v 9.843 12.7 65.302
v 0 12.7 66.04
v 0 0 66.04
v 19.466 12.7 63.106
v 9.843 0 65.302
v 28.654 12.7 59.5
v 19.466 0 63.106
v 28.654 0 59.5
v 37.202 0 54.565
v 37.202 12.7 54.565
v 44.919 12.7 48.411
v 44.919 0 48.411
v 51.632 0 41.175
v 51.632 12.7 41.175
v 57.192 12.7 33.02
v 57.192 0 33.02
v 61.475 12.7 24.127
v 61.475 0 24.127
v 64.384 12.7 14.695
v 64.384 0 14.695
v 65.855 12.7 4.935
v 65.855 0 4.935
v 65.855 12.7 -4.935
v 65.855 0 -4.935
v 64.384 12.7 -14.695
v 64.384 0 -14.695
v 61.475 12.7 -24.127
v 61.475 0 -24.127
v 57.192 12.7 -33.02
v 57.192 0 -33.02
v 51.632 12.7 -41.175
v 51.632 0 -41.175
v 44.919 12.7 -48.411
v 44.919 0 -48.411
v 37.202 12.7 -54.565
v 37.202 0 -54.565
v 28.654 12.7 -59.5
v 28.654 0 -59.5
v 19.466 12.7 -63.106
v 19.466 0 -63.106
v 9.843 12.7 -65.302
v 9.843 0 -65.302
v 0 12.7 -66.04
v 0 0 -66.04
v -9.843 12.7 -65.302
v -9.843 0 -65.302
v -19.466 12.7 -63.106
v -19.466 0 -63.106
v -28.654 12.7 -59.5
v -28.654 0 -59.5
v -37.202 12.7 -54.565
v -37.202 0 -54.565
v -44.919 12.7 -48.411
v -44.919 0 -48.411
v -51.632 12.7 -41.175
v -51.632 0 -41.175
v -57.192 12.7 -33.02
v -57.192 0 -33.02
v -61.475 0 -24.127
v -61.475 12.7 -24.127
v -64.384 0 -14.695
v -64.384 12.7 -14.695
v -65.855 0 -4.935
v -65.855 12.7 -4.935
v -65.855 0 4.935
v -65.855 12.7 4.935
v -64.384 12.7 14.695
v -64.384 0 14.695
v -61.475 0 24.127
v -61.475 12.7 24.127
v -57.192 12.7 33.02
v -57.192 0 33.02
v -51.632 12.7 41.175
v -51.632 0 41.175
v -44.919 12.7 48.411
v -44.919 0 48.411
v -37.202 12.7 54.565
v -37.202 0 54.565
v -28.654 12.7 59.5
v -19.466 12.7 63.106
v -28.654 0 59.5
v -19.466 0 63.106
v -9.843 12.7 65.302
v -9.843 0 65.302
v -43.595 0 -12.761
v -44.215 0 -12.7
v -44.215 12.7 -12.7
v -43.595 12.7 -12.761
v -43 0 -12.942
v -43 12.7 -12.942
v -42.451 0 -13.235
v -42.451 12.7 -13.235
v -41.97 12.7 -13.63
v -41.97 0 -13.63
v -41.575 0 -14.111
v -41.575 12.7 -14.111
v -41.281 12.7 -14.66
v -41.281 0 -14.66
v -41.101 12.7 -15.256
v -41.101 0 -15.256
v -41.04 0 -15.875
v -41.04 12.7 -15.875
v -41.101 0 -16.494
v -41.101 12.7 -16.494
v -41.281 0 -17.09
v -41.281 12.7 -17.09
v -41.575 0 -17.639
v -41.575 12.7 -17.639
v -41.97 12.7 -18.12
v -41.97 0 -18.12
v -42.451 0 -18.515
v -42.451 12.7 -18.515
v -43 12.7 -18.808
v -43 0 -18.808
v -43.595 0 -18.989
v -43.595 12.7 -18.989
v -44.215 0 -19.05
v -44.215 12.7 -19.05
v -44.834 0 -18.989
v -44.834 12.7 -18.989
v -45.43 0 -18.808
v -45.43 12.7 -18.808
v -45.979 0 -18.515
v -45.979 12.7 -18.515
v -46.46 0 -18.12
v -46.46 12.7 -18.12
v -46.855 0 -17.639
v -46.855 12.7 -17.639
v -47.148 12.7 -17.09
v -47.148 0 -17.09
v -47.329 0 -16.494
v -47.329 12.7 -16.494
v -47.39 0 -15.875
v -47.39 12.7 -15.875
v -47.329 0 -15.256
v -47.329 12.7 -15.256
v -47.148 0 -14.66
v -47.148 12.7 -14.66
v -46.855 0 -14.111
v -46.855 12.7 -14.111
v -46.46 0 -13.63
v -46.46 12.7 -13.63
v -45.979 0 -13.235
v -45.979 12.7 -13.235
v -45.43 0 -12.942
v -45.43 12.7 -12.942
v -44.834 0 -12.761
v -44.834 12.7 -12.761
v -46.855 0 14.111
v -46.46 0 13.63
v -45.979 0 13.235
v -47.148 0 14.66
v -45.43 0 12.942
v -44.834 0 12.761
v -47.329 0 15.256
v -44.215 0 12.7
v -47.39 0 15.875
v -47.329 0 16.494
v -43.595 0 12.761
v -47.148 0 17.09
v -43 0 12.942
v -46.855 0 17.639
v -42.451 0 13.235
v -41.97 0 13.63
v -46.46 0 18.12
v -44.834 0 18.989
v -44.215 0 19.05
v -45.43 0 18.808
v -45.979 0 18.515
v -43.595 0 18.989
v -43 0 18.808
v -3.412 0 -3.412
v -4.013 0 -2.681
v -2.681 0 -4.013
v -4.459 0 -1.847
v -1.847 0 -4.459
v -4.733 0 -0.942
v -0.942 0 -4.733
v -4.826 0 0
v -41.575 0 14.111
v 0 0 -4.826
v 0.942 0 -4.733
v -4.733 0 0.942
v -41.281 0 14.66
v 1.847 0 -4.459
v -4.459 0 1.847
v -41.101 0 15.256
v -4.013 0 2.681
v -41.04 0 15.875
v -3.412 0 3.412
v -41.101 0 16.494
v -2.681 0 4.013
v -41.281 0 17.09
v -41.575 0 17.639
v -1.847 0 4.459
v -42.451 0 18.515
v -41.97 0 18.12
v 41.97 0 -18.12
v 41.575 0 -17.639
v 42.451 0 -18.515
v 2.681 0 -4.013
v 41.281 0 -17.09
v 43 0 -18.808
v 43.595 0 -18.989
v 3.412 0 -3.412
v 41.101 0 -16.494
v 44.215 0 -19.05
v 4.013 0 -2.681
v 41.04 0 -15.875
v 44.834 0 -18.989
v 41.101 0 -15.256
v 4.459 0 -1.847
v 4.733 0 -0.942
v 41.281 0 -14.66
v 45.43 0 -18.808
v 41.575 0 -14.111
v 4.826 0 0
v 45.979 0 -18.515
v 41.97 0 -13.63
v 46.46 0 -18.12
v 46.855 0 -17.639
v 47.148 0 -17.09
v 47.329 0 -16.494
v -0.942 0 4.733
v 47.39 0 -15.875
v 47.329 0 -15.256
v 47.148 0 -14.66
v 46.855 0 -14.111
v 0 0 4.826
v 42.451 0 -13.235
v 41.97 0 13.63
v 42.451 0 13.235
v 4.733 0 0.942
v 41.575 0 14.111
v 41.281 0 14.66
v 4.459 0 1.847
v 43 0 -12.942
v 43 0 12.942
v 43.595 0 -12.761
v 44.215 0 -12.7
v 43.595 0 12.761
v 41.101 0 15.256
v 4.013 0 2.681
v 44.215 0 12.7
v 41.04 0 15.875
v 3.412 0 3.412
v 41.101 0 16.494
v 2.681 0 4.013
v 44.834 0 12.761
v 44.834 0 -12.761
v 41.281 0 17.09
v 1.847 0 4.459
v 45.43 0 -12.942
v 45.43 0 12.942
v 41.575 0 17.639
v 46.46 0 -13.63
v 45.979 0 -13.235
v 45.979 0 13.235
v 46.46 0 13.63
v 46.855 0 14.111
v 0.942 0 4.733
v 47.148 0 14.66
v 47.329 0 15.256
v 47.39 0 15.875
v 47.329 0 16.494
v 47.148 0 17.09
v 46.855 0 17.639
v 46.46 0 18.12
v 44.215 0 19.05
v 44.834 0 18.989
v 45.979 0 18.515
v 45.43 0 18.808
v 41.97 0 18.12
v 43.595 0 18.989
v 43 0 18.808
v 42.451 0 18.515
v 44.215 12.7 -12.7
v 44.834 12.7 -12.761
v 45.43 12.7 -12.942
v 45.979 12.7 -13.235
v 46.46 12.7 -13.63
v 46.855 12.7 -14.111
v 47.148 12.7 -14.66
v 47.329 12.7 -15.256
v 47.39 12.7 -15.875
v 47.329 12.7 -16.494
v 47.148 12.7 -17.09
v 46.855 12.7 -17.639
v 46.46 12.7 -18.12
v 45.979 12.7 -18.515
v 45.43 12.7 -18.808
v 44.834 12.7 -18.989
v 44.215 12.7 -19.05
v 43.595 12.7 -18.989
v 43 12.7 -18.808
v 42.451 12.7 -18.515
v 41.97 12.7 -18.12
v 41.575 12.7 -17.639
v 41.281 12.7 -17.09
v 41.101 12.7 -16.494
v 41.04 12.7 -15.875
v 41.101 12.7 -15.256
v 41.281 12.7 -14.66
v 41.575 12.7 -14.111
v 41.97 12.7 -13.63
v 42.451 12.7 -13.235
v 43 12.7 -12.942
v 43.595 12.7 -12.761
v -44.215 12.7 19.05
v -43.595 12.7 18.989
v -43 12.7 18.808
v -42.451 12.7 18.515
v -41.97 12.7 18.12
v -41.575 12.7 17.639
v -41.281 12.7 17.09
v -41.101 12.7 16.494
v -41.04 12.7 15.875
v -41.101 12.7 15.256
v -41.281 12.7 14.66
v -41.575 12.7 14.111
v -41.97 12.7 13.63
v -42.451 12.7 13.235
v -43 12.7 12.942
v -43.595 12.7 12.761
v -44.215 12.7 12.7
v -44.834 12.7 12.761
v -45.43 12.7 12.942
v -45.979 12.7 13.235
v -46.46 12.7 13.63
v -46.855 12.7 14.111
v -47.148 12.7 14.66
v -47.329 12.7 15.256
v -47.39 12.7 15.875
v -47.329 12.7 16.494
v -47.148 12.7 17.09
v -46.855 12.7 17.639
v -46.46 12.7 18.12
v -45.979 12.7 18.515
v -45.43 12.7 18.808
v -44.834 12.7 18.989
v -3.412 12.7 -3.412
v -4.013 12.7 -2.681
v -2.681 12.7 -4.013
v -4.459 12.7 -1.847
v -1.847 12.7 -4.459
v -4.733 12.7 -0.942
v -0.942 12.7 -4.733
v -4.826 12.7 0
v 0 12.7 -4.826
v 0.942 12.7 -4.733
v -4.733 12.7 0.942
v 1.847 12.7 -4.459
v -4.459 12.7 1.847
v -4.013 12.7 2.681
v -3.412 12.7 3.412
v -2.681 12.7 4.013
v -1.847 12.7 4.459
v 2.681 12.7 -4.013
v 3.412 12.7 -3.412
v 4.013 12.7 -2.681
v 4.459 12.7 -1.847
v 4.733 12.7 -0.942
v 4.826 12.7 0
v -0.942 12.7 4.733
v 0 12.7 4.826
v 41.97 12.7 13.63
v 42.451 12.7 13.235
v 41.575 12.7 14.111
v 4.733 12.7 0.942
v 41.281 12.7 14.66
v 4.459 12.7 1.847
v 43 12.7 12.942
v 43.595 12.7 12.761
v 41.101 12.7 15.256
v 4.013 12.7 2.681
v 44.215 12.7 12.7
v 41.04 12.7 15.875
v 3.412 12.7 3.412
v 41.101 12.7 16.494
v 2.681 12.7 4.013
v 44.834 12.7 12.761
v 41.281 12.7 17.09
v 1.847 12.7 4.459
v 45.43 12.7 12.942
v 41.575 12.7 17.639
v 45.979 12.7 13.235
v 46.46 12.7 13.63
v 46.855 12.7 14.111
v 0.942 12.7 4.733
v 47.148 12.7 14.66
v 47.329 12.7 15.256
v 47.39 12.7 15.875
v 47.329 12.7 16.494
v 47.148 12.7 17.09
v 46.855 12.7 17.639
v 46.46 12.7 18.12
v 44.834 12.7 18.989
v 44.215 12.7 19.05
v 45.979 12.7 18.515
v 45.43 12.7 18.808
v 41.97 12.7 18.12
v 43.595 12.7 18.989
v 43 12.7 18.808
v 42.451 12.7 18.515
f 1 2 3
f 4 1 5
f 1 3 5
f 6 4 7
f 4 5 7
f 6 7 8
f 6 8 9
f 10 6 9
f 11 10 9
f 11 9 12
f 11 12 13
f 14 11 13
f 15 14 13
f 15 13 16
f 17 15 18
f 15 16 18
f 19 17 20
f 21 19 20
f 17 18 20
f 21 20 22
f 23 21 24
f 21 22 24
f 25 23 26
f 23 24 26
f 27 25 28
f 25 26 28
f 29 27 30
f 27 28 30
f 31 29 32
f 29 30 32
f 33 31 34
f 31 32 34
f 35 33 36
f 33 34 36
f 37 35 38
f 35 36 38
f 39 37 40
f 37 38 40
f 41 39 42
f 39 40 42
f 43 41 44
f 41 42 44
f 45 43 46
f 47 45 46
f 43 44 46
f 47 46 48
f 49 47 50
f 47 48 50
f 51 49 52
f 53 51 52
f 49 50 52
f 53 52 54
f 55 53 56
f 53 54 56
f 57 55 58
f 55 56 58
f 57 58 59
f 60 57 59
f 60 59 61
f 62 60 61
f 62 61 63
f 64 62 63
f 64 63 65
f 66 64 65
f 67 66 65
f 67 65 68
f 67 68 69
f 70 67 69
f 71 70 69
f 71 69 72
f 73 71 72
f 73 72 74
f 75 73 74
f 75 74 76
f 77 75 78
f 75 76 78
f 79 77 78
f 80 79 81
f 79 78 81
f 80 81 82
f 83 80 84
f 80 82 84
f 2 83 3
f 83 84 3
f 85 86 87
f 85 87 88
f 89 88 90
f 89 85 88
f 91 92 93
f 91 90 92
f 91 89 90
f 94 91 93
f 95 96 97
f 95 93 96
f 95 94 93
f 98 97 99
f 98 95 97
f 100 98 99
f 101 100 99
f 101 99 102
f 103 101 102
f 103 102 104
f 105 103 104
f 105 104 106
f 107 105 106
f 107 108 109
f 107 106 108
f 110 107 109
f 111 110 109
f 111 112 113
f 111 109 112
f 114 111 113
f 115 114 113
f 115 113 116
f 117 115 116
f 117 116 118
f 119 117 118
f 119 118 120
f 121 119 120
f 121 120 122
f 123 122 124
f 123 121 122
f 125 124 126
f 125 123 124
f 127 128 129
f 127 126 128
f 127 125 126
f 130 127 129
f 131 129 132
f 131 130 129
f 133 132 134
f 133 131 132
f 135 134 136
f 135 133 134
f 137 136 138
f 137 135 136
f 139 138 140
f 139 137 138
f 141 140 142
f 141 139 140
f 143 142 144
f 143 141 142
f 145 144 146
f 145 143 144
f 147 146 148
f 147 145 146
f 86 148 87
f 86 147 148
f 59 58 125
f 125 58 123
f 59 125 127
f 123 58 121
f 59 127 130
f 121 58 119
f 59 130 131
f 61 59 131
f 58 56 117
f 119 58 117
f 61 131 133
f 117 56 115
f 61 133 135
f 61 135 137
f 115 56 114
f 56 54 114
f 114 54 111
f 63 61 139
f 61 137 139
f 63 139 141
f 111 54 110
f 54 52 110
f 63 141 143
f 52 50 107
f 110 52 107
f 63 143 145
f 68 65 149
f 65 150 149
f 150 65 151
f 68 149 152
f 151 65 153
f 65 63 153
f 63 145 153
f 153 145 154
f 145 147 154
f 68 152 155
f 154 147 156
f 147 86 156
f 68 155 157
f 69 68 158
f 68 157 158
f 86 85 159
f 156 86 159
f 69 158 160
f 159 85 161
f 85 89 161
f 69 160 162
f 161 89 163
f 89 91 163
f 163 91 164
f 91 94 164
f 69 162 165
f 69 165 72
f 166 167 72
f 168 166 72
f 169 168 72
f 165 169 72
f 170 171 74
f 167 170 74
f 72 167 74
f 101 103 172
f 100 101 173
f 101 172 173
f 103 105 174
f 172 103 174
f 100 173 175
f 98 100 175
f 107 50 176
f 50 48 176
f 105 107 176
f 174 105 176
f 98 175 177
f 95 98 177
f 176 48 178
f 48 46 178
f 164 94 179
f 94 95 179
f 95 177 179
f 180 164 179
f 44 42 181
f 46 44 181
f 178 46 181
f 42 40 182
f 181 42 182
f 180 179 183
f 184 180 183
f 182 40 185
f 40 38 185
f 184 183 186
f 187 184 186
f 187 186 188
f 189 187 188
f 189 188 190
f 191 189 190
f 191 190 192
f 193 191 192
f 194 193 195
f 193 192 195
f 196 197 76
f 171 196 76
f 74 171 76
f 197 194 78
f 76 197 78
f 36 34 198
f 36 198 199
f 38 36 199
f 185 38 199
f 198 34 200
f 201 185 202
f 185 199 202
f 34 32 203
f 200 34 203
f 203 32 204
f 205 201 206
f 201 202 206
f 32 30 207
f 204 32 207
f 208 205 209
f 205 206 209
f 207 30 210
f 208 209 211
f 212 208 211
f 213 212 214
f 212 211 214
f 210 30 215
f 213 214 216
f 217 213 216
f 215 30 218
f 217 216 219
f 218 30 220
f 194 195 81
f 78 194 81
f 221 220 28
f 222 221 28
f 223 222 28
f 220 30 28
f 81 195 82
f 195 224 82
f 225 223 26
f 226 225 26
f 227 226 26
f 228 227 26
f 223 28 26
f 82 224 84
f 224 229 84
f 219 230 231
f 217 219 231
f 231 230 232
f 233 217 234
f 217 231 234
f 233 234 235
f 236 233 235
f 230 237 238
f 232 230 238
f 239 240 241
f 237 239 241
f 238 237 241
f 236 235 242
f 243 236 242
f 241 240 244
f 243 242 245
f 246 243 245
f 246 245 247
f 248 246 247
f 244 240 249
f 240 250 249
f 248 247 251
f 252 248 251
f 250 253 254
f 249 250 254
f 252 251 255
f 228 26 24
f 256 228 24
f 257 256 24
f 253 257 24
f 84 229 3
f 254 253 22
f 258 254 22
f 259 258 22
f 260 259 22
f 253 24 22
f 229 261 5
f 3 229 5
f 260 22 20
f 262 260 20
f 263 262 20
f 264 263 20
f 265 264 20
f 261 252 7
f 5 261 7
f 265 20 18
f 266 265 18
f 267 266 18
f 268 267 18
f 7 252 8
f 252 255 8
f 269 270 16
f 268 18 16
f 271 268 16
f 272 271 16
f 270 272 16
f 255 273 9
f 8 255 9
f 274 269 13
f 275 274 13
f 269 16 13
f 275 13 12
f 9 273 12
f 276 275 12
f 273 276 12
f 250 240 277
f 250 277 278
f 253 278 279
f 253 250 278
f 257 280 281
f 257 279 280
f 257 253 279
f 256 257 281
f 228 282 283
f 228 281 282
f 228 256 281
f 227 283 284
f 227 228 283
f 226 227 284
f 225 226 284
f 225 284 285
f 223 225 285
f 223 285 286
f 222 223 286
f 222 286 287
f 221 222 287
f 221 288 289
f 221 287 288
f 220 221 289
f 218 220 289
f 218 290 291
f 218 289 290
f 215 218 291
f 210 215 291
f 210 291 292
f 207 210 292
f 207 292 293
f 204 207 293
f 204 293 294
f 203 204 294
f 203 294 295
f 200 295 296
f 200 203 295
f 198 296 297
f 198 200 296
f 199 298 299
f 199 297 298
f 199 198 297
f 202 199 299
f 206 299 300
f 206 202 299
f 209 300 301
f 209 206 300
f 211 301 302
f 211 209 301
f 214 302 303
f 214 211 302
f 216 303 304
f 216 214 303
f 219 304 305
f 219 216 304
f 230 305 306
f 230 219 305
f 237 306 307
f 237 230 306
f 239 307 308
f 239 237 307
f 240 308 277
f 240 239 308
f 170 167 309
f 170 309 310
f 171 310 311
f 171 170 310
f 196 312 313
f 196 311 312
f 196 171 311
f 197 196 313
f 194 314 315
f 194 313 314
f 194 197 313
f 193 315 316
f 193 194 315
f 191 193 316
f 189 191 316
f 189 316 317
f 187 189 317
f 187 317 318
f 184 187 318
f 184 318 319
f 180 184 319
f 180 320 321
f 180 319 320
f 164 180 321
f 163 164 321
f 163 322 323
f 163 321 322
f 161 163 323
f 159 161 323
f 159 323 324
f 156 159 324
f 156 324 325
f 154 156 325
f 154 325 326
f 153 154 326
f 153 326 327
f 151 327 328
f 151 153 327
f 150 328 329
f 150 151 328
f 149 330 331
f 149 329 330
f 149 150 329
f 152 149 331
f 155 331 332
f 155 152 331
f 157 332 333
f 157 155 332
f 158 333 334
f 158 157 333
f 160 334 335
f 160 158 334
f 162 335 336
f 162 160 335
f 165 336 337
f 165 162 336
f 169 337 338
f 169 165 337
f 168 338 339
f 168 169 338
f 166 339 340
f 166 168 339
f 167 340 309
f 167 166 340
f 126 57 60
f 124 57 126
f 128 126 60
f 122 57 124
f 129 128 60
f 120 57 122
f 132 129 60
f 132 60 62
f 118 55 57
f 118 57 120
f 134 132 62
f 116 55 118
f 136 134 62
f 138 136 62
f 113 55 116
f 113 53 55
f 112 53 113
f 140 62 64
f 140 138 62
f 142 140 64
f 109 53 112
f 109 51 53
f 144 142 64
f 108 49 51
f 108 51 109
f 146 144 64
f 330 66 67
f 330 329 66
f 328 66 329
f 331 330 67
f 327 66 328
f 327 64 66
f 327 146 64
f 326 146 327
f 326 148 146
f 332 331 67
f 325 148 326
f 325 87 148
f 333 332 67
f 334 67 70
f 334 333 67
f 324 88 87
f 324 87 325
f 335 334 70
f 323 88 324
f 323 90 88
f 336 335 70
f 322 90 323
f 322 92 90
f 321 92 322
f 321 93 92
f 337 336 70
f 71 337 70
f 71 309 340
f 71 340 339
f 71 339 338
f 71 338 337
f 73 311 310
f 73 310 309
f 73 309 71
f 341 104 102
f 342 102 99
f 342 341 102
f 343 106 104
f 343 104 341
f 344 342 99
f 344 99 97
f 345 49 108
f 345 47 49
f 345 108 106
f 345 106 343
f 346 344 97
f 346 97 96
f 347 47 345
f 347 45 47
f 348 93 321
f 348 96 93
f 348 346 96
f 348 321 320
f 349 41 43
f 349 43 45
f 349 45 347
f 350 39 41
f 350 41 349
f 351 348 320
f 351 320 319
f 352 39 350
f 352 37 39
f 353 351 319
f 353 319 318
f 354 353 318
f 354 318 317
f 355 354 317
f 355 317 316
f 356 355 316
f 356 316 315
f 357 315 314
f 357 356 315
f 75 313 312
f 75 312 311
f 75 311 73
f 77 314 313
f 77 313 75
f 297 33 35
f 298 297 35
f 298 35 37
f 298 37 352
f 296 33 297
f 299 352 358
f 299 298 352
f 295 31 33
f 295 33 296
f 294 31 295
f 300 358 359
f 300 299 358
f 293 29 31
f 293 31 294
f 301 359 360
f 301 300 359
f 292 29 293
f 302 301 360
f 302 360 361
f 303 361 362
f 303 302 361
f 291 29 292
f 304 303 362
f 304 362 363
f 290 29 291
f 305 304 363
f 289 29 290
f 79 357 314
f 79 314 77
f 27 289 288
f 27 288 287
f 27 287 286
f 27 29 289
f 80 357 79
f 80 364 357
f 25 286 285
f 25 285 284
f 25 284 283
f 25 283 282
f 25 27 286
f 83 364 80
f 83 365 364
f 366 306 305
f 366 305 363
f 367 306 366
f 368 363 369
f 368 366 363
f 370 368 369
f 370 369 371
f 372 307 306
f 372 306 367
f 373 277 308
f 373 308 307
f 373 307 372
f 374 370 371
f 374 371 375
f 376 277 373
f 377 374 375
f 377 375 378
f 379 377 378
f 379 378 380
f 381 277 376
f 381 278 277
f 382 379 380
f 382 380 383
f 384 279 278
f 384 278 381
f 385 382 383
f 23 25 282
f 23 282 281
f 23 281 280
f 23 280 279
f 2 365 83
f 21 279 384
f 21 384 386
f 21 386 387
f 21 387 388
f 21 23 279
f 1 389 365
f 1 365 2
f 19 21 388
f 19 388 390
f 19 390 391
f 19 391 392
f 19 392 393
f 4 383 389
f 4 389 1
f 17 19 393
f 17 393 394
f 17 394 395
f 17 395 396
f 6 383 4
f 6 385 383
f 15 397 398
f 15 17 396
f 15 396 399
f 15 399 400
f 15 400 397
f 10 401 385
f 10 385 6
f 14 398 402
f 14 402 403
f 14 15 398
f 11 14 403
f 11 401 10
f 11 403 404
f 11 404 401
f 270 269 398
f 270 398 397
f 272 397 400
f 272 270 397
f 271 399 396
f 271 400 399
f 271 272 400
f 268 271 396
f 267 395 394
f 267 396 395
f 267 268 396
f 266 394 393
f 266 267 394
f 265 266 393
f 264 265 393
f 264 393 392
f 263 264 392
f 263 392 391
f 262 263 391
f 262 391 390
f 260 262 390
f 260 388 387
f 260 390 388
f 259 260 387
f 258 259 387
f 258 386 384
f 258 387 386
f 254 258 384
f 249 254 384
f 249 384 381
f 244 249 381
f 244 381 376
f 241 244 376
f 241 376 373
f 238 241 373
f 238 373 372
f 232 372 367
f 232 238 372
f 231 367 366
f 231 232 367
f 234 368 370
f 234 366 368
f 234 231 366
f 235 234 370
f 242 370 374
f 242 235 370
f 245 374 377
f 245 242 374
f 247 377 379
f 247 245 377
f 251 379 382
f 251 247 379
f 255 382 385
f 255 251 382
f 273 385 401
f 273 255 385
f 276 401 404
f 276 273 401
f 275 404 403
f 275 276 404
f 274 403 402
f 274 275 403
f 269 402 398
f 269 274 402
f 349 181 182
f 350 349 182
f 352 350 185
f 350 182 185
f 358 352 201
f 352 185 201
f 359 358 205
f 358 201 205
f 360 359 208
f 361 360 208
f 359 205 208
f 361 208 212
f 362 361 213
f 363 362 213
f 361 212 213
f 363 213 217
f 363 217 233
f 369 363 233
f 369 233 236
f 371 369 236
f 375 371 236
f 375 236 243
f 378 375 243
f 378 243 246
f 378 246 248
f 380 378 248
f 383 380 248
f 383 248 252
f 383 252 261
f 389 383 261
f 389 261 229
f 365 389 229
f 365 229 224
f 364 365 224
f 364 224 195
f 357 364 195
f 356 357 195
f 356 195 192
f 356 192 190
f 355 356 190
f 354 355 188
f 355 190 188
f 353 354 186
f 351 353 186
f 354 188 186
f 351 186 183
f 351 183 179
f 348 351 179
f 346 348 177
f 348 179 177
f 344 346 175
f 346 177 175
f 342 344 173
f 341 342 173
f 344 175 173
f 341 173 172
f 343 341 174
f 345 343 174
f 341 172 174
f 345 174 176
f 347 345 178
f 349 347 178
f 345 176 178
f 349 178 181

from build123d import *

# Parameters (mm, degrees)
SKETCH1_R               = 66.04
BOSS_EXTRUDE1_DEPTH     = 12.7
CUT_EXTRUDE1_DEPTH      = 95.254194602
CUT_EXTRUDE1_DEPTH_BACK = 95.254194602
SKETCH2_R               = 3.175
SKETCH4_R               = 4.826
CUT_EXTRUDE2_DEPTH      = 95.254194602


with BuildPart() as part:
    # Sketch1 → Boss-Extrude1 (new body)
    with BuildSketch(Plane(origin=(0, 0, 0), x_dir=(1, 0, 0), z_dir=(0, 1, 0))):
        with Locations(Location((0, 0, 0), (0, 0, 270))):
            Circle(SKETCH1_R)
    extrude(amount=BOSS_EXTRUDE1_DEPTH)

    # Sketch2 → Cut-Extrude1 (cut, two sides: drawn at the far end of the back side and taken through both)
    with BuildSketch(Plane(origin=(0, 12.7, 0), x_dir=(1, 0, 0), z_dir=(0, 1, 0)).offset(-CUT_EXTRUDE1_DEPTH_BACK)):
        with Locations(Location((-44.214813621, 15.875, 0), (0, 0, 270))):
            Circle(SKETCH2_R)
        with Locations(Location((-44.214813621, -15.875, 0), (0, 0, 270))):
            Circle(SKETCH2_R)
        with Locations(Location((44.214813621, -15.875, 0), (0, 0, 270))):
            Circle(SKETCH2_R)
        with Locations(Location((44.214813621, 15.875, 0), (0, 0, 270))):
            Circle(SKETCH2_R)
    extrude(amount=CUT_EXTRUDE1_DEPTH + CUT_EXTRUDE1_DEPTH_BACK, mode=Mode.SUBTRACT)

    # Sketch4 → Cut-Extrude2 (cut, through all)
    with BuildSketch(Plane.XZ):
        with Locations(Location((0, 0, 0), (0, 0, 270))):
            Circle(SKETCH4_R)
    extrude(amount=-CUT_EXTRUDE2_DEPTH, mode=Mode.SUBTRACT)


solid = part.part
